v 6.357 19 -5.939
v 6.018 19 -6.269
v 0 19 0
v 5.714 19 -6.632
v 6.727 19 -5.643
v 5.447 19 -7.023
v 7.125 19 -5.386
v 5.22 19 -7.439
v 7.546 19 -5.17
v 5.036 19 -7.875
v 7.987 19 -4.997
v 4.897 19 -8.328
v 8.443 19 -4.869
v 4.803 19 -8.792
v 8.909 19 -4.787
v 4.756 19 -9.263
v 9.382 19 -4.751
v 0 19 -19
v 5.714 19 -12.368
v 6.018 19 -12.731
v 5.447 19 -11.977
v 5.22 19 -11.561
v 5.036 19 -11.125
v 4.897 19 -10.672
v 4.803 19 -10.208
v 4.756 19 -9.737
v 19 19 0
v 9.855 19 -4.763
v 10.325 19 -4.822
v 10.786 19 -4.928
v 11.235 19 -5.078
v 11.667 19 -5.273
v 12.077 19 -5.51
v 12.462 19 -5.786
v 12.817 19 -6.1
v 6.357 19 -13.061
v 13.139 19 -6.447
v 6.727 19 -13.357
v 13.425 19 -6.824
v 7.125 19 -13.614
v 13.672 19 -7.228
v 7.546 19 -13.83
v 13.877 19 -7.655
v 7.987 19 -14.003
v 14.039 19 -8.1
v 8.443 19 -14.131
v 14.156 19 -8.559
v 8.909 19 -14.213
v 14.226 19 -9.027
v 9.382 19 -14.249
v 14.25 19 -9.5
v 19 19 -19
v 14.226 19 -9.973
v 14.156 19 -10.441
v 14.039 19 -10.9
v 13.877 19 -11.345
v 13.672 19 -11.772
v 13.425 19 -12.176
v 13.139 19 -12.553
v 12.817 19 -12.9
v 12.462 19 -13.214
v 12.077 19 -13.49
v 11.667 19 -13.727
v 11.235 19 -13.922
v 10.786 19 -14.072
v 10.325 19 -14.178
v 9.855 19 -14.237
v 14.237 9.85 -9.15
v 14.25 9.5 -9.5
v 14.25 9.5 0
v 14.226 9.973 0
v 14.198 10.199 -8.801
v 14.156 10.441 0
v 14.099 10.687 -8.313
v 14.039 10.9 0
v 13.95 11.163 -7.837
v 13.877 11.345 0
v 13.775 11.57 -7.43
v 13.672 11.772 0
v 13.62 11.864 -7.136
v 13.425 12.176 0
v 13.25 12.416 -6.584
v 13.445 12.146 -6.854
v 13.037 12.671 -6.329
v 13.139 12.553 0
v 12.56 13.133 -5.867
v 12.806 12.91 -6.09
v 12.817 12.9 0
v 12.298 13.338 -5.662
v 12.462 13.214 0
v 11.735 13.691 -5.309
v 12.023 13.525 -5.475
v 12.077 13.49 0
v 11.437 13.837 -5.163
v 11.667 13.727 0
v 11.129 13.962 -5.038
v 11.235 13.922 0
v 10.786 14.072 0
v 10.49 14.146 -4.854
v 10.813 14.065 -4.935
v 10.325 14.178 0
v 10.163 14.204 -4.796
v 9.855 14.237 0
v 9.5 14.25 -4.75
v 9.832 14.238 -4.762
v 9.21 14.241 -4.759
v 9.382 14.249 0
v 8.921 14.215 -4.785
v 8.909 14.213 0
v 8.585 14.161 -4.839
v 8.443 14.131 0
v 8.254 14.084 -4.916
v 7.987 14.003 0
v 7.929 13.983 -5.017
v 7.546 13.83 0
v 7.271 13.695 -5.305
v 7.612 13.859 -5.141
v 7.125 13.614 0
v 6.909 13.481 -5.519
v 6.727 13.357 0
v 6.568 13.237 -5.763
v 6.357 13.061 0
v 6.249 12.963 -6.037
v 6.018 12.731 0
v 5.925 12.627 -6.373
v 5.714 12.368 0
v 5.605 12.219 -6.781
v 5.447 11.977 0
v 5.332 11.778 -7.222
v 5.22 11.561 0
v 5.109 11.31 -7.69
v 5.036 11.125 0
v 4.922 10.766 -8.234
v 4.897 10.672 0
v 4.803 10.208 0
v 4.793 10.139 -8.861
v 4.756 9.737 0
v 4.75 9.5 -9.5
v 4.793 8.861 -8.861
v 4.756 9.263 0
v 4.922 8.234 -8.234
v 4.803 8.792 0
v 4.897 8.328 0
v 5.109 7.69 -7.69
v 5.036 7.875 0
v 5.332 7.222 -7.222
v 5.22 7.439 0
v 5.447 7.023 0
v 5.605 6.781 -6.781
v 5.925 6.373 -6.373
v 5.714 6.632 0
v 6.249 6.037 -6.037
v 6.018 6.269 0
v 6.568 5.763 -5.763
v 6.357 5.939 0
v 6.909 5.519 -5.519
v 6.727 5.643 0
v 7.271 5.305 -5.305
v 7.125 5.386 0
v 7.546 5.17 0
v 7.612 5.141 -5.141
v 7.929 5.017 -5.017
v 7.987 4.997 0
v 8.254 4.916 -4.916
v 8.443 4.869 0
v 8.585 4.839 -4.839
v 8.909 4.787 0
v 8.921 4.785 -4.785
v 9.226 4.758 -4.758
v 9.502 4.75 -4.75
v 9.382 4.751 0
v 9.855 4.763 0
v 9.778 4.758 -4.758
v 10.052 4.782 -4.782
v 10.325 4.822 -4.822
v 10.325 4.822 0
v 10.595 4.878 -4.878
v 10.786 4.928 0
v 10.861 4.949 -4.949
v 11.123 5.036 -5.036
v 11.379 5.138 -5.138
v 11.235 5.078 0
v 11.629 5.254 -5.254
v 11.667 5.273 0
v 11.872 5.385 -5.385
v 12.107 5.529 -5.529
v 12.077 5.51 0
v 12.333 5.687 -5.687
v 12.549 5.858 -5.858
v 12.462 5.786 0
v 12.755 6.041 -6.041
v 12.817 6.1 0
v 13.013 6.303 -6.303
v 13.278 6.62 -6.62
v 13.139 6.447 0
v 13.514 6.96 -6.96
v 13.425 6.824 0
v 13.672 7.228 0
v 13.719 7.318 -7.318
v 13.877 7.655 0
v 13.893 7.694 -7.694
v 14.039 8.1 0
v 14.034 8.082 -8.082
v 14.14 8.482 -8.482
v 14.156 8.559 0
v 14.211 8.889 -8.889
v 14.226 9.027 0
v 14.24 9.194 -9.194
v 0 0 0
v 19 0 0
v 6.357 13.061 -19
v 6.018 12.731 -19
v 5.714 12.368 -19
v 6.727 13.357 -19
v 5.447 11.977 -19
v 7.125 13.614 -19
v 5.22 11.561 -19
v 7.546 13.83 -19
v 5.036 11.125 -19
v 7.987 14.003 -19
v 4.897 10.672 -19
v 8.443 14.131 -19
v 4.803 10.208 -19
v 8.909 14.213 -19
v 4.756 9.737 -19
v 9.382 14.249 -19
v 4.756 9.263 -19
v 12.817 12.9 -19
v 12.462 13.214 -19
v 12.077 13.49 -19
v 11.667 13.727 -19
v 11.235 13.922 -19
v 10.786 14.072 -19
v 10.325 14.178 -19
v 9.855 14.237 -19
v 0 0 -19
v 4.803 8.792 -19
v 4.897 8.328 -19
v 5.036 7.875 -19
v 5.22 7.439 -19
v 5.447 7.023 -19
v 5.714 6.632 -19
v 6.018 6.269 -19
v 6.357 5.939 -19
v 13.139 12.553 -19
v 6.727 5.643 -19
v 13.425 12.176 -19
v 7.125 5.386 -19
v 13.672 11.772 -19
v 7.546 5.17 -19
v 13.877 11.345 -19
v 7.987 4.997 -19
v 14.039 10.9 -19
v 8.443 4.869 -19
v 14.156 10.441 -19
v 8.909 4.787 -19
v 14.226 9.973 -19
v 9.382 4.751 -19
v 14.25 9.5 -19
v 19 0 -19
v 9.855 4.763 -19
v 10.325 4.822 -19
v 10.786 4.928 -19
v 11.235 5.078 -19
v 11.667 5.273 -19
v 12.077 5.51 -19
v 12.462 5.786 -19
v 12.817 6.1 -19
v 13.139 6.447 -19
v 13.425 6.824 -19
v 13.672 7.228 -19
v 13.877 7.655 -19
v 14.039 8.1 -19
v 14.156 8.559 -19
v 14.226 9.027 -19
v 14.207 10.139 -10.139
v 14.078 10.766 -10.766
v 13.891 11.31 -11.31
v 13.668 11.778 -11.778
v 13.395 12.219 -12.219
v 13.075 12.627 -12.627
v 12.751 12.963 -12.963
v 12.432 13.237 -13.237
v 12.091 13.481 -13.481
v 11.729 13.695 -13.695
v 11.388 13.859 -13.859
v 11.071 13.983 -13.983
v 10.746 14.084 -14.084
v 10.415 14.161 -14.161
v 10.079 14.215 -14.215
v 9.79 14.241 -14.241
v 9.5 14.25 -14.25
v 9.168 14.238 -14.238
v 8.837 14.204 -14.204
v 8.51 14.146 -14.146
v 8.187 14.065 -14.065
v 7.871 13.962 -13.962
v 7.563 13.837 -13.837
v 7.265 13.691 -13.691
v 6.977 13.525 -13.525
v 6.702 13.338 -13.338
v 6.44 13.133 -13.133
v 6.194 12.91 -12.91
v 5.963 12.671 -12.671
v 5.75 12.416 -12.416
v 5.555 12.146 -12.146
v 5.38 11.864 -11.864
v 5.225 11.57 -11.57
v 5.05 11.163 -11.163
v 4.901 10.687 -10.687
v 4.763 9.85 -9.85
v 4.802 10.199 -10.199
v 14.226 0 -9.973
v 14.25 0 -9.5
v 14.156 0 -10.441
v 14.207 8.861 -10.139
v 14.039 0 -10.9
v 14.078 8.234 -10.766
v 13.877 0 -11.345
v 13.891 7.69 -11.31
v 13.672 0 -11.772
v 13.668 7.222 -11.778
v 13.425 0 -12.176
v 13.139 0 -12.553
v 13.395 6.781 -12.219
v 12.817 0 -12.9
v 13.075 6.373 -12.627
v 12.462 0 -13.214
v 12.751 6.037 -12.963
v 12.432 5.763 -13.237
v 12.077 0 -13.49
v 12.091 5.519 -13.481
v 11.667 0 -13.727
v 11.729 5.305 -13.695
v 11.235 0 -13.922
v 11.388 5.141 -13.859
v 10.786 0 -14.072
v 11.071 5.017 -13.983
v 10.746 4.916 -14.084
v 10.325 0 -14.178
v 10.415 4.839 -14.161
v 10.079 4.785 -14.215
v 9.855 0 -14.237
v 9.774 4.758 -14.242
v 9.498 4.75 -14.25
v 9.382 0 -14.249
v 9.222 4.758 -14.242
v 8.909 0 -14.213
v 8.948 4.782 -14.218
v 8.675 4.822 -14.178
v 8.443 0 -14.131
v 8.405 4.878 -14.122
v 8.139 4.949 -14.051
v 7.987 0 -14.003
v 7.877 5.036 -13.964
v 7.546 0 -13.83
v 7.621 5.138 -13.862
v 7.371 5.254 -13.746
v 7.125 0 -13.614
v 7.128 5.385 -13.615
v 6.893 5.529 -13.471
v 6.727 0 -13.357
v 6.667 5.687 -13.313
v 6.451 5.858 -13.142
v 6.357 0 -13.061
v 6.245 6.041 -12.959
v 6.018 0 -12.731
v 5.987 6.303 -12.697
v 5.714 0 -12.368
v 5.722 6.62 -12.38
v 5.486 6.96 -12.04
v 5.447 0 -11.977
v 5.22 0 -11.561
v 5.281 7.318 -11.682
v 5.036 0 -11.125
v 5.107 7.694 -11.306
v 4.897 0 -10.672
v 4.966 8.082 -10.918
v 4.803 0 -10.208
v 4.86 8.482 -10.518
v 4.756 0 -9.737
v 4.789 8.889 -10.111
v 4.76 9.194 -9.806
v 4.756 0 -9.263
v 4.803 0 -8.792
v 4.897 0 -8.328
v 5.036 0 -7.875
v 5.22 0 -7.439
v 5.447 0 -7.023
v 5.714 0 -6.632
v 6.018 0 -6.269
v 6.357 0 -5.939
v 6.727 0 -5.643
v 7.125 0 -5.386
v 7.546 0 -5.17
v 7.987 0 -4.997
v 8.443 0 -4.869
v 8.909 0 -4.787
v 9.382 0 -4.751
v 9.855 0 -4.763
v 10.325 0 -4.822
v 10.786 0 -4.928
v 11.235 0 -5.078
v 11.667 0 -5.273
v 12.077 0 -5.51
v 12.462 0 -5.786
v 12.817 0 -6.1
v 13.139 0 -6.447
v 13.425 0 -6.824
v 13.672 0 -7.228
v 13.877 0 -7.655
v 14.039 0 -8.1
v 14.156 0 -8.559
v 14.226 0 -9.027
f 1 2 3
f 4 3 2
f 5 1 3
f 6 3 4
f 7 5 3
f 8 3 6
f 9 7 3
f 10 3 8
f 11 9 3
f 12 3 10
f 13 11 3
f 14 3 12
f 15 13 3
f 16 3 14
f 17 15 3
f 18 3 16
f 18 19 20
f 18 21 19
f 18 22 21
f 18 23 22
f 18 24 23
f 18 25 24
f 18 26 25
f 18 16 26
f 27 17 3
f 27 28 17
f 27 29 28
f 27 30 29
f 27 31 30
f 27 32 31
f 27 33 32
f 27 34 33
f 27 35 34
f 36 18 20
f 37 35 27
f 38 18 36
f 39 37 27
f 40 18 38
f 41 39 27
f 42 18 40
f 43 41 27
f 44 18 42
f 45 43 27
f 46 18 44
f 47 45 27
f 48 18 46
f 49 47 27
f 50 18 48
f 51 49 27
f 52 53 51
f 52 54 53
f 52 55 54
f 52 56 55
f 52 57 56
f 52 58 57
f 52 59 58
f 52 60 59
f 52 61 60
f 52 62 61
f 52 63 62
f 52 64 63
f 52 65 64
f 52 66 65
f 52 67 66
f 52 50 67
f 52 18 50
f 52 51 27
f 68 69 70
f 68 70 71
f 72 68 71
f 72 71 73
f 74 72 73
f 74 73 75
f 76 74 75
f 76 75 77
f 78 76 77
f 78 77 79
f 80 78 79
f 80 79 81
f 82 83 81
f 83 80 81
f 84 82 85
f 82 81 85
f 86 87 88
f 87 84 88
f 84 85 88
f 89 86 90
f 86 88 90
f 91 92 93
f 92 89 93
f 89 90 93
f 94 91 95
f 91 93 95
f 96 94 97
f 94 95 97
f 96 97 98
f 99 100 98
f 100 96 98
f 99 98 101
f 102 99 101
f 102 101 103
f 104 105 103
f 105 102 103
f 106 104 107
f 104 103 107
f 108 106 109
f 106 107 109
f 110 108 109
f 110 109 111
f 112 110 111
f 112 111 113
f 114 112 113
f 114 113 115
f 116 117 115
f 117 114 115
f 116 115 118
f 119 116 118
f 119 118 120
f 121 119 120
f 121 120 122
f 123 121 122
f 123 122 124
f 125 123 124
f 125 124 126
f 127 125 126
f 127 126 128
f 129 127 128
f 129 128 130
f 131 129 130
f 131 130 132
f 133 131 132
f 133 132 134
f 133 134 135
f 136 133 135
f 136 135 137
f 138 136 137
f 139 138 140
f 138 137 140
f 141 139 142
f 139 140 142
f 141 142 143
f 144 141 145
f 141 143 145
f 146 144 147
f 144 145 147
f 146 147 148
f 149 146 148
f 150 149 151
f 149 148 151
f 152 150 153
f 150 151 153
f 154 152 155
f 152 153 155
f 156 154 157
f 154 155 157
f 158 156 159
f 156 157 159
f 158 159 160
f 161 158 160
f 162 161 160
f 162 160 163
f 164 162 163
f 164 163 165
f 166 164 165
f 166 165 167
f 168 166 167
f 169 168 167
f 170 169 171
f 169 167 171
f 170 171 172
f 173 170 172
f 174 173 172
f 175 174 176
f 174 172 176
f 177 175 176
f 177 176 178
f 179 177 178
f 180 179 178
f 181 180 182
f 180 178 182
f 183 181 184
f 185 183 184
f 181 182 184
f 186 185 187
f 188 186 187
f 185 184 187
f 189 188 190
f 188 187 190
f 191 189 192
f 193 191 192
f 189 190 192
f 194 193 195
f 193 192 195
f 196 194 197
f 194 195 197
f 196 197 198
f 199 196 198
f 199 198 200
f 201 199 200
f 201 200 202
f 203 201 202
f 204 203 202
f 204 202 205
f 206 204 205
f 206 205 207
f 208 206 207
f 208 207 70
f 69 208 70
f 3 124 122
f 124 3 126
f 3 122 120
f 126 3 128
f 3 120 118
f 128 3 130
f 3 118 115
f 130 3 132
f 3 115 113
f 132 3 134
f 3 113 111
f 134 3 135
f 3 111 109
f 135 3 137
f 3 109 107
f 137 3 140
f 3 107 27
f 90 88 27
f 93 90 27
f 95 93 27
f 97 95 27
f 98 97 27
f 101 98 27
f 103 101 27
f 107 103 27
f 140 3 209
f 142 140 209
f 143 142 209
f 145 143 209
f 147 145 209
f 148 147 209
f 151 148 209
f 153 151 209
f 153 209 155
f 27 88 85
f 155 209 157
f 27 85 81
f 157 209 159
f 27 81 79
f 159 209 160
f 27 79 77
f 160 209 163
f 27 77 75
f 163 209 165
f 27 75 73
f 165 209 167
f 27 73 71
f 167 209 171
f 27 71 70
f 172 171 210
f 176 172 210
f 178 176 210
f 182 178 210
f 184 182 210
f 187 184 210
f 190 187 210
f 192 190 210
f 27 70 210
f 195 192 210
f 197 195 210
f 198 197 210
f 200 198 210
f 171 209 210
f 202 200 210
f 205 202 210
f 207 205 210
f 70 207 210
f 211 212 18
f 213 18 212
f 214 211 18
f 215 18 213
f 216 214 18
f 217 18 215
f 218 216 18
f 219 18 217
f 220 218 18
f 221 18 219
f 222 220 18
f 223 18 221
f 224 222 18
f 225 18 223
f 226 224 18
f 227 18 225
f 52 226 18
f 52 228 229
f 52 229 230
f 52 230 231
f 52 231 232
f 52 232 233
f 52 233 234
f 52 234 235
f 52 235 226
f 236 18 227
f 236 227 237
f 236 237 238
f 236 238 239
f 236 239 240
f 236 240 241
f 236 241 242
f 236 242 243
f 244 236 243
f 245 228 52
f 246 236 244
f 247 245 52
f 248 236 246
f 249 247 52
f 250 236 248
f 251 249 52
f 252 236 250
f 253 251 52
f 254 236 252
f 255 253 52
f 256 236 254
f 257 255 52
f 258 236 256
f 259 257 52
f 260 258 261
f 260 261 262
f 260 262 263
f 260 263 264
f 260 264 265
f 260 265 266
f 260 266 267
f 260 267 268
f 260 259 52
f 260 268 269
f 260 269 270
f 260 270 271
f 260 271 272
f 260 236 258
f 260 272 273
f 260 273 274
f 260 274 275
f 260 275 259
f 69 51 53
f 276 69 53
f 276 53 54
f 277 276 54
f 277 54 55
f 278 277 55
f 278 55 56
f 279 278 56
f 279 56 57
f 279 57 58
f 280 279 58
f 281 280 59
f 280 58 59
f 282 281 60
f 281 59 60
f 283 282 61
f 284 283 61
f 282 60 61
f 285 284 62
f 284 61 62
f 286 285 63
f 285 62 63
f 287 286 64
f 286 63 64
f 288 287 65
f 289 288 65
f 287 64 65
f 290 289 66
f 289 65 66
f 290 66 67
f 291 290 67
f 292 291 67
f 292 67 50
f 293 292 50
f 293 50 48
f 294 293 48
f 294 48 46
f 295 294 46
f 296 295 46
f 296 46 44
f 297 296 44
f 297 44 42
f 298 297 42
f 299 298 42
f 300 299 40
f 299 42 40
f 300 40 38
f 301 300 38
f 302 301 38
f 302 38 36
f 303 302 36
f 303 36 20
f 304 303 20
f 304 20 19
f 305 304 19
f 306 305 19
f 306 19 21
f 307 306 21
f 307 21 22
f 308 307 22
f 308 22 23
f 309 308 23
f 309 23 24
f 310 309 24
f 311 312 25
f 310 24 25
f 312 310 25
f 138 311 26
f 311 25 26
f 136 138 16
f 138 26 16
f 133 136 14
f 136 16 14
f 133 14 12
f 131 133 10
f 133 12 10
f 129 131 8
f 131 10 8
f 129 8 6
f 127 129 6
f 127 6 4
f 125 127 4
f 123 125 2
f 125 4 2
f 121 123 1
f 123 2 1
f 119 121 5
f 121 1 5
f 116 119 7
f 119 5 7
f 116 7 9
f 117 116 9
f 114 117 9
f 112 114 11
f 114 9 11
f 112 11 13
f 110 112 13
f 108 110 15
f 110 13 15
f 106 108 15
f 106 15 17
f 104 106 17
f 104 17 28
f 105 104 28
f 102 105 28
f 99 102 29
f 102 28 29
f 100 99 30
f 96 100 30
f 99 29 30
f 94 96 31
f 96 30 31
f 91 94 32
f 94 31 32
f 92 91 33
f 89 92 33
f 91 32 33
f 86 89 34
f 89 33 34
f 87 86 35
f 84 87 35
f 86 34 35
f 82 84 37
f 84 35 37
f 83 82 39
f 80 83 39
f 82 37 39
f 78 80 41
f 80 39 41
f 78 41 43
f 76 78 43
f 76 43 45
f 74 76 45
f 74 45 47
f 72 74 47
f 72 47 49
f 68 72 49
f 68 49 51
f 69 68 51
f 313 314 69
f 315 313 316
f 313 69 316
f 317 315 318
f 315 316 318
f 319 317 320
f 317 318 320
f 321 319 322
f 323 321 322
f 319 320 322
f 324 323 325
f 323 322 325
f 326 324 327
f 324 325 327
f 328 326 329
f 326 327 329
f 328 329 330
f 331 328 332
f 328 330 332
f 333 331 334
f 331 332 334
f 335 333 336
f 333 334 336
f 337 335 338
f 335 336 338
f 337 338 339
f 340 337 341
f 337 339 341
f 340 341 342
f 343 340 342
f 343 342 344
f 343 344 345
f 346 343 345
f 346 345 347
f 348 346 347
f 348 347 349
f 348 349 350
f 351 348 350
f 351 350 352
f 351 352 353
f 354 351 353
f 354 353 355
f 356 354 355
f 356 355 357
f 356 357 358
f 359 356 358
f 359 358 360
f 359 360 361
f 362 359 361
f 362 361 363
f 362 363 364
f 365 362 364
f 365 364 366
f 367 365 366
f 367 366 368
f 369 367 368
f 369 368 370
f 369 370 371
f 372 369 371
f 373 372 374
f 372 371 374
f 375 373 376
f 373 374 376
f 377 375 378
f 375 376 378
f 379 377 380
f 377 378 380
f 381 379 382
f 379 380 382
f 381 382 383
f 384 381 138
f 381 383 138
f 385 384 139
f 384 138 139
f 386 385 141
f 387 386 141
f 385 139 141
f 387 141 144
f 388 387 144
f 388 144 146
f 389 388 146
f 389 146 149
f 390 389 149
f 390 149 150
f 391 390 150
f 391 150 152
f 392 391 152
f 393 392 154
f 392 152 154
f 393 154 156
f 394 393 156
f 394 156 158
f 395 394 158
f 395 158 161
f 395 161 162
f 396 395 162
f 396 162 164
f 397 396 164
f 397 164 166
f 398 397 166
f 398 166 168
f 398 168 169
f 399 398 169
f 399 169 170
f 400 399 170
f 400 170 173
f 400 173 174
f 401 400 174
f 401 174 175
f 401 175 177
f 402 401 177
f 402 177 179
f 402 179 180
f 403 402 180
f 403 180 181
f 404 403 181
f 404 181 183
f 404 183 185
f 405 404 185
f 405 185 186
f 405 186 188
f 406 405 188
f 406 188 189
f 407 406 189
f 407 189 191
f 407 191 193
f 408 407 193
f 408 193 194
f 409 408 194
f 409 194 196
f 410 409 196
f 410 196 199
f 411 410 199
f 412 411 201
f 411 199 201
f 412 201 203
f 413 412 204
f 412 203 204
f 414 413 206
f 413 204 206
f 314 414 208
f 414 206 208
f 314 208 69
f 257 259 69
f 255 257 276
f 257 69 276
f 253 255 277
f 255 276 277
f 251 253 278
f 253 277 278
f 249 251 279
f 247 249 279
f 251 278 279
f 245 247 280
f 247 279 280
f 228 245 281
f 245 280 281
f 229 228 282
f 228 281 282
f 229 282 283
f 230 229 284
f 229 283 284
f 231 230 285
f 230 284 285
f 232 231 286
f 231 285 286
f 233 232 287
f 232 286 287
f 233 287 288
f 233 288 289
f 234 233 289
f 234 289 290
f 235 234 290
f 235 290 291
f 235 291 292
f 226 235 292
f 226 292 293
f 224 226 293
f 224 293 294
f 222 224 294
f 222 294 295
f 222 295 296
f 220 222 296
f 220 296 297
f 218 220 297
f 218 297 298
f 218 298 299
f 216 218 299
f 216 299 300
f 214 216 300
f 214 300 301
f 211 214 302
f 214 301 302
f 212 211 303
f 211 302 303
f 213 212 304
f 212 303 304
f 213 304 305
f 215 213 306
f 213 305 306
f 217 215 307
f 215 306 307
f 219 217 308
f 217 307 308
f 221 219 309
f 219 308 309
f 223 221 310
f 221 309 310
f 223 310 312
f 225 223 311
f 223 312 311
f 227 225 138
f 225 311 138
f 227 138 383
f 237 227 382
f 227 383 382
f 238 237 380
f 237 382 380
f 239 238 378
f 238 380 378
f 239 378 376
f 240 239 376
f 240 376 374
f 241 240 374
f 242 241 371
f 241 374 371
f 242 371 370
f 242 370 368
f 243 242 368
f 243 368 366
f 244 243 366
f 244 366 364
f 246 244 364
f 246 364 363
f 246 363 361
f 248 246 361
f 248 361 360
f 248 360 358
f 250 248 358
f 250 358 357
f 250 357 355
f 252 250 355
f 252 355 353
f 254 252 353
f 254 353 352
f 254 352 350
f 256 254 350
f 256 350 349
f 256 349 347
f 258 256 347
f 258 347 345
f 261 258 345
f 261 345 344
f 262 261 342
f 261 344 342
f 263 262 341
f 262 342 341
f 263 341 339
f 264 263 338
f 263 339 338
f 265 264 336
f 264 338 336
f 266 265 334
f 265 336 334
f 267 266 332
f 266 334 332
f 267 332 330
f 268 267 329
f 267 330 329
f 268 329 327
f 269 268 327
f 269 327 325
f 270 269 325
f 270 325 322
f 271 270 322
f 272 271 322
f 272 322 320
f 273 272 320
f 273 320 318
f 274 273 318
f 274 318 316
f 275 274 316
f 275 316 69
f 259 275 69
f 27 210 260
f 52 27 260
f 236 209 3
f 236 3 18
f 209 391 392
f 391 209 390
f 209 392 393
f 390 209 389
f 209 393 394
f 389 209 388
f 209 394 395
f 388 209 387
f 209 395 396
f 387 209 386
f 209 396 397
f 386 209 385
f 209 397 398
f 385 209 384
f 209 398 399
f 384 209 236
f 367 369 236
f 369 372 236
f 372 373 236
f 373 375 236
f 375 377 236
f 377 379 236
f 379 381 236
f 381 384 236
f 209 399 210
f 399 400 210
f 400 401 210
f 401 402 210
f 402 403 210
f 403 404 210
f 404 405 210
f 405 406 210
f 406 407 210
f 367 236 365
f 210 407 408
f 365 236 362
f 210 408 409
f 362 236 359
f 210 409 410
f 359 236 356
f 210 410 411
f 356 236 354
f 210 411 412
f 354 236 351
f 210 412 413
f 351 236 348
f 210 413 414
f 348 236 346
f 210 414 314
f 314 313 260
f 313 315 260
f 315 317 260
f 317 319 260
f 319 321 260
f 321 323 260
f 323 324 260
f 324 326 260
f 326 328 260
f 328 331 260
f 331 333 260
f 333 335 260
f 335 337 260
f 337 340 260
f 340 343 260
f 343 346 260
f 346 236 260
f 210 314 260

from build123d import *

# Parameters (mm, degrees)
SKETCH1_W           = 19
SKETCH1_H           = 19
BOSS_EXTRUDE1_DEPTH = 19
SKETCH2_R           = 4.75
CUT_EXTRUDE1_DEPTH  = 19
SKETCH3_R           = 4.75
CUT_EXTRUDE2_DEPTH  = 19


with BuildPart() as part:
    # Sketch1 → Boss-Extrude1 (new body)
    with BuildSketch(Plane(origin=(0, 0, 0), x_dir=(1, 0, 0), z_dir=(0, 1, 0))):
        with Locations((9.5, 9.5)):
            Rectangle(SKETCH1_W, SKETCH1_H)
    extrude(amount=BOSS_EXTRUDE1_DEPTH)

    # Sketch2 → Cut-Extrude1 (cut)
    with BuildSketch(Plane(origin=(0, 19, 0), x_dir=(1, 0, 0), z_dir=(0, 1, 0))):
        with Locations((9.5, 9.5)):
            Circle(SKETCH2_R)
    extrude(amount=-CUT_EXTRUDE1_DEPTH, mode=Mode.SUBTRACT)

    # Sketch3 → Cut-Extrude2 (cut)
    with BuildSketch(Plane.XY):
        with Locations((9.5, 9.5)):
            Circle(SKETCH3_R)
    extrude(amount=-CUT_EXTRUDE2_DEPTH, mode=Mode.SUBTRACT)


solid = part.part
